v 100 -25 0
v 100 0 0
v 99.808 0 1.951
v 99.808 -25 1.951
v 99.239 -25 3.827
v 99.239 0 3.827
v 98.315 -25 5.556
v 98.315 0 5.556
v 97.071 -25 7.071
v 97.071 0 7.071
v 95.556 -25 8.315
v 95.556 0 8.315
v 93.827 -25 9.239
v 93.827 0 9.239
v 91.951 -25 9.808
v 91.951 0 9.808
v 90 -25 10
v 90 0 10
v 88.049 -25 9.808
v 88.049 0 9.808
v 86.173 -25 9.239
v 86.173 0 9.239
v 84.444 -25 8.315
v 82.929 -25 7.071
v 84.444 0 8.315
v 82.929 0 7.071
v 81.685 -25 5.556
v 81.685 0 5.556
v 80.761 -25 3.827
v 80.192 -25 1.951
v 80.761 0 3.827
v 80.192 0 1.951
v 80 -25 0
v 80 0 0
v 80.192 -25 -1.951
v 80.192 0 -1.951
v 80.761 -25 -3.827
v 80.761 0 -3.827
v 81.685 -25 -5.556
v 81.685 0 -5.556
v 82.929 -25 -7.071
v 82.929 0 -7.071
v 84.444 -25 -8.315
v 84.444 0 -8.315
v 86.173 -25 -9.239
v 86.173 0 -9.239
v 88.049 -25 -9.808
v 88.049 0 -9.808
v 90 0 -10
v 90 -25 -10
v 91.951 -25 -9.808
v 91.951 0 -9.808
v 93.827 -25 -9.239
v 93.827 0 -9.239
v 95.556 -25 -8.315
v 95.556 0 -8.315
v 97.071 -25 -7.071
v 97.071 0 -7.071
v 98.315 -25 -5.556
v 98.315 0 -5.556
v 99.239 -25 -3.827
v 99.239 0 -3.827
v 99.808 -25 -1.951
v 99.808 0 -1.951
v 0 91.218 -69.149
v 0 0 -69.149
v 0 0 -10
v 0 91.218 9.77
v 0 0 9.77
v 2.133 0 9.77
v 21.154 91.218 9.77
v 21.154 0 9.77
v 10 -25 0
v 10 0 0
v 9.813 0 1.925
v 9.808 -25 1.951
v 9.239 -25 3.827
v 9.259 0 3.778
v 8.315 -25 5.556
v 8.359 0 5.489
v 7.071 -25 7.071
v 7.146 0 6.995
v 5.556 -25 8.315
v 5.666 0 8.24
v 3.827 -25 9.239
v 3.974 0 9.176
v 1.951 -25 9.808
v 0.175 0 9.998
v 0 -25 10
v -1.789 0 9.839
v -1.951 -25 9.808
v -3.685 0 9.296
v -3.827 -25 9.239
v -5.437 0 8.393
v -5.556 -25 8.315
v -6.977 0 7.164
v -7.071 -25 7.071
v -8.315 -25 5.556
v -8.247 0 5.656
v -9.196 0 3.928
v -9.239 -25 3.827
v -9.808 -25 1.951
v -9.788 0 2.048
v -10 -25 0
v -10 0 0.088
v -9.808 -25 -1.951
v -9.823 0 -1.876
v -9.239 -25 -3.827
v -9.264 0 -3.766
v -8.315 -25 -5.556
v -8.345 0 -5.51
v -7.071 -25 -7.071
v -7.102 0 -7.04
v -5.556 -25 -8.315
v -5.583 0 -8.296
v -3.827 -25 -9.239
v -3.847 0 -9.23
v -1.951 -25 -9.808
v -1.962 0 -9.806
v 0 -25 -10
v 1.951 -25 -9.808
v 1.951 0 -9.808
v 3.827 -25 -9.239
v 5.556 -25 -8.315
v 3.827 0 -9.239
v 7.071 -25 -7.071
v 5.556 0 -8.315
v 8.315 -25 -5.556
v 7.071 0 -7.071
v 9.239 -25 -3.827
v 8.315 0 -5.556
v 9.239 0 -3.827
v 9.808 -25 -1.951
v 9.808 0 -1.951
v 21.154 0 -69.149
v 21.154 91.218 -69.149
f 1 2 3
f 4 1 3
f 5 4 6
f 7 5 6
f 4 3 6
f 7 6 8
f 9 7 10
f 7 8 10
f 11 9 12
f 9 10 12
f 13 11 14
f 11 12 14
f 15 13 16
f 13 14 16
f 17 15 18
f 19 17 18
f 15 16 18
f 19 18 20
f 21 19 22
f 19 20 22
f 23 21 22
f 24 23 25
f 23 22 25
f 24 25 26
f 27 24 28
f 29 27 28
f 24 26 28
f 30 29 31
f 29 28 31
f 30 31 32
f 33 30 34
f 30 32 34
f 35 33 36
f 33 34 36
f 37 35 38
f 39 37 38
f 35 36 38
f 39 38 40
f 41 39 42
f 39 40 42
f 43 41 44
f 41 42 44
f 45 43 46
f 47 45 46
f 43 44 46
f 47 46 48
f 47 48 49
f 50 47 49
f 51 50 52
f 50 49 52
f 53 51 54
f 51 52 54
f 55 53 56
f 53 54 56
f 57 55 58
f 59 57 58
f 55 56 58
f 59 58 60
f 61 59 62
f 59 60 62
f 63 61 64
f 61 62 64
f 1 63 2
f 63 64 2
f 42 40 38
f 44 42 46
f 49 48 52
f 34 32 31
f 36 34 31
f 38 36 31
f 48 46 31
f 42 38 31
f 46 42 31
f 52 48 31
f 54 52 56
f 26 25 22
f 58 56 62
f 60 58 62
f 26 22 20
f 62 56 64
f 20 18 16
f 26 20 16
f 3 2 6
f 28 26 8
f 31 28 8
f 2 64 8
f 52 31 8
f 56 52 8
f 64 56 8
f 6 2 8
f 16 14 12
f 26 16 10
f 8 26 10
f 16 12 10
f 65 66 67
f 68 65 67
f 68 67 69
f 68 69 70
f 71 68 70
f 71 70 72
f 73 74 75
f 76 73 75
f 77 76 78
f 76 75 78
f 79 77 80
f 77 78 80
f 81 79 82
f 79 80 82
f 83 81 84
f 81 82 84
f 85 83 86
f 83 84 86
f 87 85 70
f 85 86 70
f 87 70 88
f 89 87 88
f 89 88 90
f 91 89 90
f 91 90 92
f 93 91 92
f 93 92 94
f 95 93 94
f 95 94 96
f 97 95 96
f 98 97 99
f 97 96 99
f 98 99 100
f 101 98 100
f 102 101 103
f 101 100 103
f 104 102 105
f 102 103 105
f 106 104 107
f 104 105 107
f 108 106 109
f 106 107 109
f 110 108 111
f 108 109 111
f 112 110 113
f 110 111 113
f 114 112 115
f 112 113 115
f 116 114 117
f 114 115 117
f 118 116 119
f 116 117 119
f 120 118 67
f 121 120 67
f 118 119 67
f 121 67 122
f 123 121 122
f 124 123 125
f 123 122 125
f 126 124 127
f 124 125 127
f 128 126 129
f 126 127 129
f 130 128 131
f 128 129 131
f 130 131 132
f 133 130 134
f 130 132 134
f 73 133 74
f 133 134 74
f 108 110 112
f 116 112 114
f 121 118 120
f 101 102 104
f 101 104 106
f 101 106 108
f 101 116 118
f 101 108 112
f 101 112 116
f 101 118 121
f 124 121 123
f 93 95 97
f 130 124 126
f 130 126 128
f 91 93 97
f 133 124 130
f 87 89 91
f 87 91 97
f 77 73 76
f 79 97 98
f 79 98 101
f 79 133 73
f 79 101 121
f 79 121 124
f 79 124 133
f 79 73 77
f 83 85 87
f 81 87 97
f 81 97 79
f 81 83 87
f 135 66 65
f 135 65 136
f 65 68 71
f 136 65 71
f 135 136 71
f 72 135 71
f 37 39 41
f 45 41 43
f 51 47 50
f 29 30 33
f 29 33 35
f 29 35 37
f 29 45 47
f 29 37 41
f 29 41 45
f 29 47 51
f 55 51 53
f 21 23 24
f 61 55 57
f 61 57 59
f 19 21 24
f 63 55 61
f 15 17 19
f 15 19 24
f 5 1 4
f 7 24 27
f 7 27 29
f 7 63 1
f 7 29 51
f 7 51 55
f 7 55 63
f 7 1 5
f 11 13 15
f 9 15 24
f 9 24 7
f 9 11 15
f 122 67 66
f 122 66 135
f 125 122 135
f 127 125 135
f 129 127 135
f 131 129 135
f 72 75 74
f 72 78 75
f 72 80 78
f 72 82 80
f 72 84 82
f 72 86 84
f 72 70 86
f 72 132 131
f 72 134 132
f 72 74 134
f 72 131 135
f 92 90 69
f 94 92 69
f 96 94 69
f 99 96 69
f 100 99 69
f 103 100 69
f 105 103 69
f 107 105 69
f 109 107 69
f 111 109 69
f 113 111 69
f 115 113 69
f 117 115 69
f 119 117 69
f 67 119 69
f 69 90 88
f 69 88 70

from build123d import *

# Parameters (mm, degrees)
F0_R     = 10
F1_DEPTH = 25
F2_W     = 21.1537368596
F2_H     = 78.9189003408
F3_DEPTH = 91.2176873535


# Not quite as in the source:
# - a feature names something its author has since deleted; it is built from what else it names


with BuildPart() as f1:
    # F0 (on Front) → F1 (new body)
    with BuildSketch(Plane.XZ):
        Circle(F0_R)
    extrude(amount=F1_DEPTH)

    # F2 (on face) → F3 (join)
    with BuildSketch(Plane.XZ):
        with Locations((10.5768684298, -29.6896714717)):
            Rectangle(F2_W, F2_H)
    extrude(amount=-F3_DEPTH)


with BuildPart() as f1b:
    # F0 (on Front) → F1, piece 2 (new body)
    with BuildSketch(Plane.XZ):
        with Locations((90, 0)):
            Circle(F0_R)
    extrude(amount=F1_DEPTH)


solid = Compound([f1.part, f1b.part])
